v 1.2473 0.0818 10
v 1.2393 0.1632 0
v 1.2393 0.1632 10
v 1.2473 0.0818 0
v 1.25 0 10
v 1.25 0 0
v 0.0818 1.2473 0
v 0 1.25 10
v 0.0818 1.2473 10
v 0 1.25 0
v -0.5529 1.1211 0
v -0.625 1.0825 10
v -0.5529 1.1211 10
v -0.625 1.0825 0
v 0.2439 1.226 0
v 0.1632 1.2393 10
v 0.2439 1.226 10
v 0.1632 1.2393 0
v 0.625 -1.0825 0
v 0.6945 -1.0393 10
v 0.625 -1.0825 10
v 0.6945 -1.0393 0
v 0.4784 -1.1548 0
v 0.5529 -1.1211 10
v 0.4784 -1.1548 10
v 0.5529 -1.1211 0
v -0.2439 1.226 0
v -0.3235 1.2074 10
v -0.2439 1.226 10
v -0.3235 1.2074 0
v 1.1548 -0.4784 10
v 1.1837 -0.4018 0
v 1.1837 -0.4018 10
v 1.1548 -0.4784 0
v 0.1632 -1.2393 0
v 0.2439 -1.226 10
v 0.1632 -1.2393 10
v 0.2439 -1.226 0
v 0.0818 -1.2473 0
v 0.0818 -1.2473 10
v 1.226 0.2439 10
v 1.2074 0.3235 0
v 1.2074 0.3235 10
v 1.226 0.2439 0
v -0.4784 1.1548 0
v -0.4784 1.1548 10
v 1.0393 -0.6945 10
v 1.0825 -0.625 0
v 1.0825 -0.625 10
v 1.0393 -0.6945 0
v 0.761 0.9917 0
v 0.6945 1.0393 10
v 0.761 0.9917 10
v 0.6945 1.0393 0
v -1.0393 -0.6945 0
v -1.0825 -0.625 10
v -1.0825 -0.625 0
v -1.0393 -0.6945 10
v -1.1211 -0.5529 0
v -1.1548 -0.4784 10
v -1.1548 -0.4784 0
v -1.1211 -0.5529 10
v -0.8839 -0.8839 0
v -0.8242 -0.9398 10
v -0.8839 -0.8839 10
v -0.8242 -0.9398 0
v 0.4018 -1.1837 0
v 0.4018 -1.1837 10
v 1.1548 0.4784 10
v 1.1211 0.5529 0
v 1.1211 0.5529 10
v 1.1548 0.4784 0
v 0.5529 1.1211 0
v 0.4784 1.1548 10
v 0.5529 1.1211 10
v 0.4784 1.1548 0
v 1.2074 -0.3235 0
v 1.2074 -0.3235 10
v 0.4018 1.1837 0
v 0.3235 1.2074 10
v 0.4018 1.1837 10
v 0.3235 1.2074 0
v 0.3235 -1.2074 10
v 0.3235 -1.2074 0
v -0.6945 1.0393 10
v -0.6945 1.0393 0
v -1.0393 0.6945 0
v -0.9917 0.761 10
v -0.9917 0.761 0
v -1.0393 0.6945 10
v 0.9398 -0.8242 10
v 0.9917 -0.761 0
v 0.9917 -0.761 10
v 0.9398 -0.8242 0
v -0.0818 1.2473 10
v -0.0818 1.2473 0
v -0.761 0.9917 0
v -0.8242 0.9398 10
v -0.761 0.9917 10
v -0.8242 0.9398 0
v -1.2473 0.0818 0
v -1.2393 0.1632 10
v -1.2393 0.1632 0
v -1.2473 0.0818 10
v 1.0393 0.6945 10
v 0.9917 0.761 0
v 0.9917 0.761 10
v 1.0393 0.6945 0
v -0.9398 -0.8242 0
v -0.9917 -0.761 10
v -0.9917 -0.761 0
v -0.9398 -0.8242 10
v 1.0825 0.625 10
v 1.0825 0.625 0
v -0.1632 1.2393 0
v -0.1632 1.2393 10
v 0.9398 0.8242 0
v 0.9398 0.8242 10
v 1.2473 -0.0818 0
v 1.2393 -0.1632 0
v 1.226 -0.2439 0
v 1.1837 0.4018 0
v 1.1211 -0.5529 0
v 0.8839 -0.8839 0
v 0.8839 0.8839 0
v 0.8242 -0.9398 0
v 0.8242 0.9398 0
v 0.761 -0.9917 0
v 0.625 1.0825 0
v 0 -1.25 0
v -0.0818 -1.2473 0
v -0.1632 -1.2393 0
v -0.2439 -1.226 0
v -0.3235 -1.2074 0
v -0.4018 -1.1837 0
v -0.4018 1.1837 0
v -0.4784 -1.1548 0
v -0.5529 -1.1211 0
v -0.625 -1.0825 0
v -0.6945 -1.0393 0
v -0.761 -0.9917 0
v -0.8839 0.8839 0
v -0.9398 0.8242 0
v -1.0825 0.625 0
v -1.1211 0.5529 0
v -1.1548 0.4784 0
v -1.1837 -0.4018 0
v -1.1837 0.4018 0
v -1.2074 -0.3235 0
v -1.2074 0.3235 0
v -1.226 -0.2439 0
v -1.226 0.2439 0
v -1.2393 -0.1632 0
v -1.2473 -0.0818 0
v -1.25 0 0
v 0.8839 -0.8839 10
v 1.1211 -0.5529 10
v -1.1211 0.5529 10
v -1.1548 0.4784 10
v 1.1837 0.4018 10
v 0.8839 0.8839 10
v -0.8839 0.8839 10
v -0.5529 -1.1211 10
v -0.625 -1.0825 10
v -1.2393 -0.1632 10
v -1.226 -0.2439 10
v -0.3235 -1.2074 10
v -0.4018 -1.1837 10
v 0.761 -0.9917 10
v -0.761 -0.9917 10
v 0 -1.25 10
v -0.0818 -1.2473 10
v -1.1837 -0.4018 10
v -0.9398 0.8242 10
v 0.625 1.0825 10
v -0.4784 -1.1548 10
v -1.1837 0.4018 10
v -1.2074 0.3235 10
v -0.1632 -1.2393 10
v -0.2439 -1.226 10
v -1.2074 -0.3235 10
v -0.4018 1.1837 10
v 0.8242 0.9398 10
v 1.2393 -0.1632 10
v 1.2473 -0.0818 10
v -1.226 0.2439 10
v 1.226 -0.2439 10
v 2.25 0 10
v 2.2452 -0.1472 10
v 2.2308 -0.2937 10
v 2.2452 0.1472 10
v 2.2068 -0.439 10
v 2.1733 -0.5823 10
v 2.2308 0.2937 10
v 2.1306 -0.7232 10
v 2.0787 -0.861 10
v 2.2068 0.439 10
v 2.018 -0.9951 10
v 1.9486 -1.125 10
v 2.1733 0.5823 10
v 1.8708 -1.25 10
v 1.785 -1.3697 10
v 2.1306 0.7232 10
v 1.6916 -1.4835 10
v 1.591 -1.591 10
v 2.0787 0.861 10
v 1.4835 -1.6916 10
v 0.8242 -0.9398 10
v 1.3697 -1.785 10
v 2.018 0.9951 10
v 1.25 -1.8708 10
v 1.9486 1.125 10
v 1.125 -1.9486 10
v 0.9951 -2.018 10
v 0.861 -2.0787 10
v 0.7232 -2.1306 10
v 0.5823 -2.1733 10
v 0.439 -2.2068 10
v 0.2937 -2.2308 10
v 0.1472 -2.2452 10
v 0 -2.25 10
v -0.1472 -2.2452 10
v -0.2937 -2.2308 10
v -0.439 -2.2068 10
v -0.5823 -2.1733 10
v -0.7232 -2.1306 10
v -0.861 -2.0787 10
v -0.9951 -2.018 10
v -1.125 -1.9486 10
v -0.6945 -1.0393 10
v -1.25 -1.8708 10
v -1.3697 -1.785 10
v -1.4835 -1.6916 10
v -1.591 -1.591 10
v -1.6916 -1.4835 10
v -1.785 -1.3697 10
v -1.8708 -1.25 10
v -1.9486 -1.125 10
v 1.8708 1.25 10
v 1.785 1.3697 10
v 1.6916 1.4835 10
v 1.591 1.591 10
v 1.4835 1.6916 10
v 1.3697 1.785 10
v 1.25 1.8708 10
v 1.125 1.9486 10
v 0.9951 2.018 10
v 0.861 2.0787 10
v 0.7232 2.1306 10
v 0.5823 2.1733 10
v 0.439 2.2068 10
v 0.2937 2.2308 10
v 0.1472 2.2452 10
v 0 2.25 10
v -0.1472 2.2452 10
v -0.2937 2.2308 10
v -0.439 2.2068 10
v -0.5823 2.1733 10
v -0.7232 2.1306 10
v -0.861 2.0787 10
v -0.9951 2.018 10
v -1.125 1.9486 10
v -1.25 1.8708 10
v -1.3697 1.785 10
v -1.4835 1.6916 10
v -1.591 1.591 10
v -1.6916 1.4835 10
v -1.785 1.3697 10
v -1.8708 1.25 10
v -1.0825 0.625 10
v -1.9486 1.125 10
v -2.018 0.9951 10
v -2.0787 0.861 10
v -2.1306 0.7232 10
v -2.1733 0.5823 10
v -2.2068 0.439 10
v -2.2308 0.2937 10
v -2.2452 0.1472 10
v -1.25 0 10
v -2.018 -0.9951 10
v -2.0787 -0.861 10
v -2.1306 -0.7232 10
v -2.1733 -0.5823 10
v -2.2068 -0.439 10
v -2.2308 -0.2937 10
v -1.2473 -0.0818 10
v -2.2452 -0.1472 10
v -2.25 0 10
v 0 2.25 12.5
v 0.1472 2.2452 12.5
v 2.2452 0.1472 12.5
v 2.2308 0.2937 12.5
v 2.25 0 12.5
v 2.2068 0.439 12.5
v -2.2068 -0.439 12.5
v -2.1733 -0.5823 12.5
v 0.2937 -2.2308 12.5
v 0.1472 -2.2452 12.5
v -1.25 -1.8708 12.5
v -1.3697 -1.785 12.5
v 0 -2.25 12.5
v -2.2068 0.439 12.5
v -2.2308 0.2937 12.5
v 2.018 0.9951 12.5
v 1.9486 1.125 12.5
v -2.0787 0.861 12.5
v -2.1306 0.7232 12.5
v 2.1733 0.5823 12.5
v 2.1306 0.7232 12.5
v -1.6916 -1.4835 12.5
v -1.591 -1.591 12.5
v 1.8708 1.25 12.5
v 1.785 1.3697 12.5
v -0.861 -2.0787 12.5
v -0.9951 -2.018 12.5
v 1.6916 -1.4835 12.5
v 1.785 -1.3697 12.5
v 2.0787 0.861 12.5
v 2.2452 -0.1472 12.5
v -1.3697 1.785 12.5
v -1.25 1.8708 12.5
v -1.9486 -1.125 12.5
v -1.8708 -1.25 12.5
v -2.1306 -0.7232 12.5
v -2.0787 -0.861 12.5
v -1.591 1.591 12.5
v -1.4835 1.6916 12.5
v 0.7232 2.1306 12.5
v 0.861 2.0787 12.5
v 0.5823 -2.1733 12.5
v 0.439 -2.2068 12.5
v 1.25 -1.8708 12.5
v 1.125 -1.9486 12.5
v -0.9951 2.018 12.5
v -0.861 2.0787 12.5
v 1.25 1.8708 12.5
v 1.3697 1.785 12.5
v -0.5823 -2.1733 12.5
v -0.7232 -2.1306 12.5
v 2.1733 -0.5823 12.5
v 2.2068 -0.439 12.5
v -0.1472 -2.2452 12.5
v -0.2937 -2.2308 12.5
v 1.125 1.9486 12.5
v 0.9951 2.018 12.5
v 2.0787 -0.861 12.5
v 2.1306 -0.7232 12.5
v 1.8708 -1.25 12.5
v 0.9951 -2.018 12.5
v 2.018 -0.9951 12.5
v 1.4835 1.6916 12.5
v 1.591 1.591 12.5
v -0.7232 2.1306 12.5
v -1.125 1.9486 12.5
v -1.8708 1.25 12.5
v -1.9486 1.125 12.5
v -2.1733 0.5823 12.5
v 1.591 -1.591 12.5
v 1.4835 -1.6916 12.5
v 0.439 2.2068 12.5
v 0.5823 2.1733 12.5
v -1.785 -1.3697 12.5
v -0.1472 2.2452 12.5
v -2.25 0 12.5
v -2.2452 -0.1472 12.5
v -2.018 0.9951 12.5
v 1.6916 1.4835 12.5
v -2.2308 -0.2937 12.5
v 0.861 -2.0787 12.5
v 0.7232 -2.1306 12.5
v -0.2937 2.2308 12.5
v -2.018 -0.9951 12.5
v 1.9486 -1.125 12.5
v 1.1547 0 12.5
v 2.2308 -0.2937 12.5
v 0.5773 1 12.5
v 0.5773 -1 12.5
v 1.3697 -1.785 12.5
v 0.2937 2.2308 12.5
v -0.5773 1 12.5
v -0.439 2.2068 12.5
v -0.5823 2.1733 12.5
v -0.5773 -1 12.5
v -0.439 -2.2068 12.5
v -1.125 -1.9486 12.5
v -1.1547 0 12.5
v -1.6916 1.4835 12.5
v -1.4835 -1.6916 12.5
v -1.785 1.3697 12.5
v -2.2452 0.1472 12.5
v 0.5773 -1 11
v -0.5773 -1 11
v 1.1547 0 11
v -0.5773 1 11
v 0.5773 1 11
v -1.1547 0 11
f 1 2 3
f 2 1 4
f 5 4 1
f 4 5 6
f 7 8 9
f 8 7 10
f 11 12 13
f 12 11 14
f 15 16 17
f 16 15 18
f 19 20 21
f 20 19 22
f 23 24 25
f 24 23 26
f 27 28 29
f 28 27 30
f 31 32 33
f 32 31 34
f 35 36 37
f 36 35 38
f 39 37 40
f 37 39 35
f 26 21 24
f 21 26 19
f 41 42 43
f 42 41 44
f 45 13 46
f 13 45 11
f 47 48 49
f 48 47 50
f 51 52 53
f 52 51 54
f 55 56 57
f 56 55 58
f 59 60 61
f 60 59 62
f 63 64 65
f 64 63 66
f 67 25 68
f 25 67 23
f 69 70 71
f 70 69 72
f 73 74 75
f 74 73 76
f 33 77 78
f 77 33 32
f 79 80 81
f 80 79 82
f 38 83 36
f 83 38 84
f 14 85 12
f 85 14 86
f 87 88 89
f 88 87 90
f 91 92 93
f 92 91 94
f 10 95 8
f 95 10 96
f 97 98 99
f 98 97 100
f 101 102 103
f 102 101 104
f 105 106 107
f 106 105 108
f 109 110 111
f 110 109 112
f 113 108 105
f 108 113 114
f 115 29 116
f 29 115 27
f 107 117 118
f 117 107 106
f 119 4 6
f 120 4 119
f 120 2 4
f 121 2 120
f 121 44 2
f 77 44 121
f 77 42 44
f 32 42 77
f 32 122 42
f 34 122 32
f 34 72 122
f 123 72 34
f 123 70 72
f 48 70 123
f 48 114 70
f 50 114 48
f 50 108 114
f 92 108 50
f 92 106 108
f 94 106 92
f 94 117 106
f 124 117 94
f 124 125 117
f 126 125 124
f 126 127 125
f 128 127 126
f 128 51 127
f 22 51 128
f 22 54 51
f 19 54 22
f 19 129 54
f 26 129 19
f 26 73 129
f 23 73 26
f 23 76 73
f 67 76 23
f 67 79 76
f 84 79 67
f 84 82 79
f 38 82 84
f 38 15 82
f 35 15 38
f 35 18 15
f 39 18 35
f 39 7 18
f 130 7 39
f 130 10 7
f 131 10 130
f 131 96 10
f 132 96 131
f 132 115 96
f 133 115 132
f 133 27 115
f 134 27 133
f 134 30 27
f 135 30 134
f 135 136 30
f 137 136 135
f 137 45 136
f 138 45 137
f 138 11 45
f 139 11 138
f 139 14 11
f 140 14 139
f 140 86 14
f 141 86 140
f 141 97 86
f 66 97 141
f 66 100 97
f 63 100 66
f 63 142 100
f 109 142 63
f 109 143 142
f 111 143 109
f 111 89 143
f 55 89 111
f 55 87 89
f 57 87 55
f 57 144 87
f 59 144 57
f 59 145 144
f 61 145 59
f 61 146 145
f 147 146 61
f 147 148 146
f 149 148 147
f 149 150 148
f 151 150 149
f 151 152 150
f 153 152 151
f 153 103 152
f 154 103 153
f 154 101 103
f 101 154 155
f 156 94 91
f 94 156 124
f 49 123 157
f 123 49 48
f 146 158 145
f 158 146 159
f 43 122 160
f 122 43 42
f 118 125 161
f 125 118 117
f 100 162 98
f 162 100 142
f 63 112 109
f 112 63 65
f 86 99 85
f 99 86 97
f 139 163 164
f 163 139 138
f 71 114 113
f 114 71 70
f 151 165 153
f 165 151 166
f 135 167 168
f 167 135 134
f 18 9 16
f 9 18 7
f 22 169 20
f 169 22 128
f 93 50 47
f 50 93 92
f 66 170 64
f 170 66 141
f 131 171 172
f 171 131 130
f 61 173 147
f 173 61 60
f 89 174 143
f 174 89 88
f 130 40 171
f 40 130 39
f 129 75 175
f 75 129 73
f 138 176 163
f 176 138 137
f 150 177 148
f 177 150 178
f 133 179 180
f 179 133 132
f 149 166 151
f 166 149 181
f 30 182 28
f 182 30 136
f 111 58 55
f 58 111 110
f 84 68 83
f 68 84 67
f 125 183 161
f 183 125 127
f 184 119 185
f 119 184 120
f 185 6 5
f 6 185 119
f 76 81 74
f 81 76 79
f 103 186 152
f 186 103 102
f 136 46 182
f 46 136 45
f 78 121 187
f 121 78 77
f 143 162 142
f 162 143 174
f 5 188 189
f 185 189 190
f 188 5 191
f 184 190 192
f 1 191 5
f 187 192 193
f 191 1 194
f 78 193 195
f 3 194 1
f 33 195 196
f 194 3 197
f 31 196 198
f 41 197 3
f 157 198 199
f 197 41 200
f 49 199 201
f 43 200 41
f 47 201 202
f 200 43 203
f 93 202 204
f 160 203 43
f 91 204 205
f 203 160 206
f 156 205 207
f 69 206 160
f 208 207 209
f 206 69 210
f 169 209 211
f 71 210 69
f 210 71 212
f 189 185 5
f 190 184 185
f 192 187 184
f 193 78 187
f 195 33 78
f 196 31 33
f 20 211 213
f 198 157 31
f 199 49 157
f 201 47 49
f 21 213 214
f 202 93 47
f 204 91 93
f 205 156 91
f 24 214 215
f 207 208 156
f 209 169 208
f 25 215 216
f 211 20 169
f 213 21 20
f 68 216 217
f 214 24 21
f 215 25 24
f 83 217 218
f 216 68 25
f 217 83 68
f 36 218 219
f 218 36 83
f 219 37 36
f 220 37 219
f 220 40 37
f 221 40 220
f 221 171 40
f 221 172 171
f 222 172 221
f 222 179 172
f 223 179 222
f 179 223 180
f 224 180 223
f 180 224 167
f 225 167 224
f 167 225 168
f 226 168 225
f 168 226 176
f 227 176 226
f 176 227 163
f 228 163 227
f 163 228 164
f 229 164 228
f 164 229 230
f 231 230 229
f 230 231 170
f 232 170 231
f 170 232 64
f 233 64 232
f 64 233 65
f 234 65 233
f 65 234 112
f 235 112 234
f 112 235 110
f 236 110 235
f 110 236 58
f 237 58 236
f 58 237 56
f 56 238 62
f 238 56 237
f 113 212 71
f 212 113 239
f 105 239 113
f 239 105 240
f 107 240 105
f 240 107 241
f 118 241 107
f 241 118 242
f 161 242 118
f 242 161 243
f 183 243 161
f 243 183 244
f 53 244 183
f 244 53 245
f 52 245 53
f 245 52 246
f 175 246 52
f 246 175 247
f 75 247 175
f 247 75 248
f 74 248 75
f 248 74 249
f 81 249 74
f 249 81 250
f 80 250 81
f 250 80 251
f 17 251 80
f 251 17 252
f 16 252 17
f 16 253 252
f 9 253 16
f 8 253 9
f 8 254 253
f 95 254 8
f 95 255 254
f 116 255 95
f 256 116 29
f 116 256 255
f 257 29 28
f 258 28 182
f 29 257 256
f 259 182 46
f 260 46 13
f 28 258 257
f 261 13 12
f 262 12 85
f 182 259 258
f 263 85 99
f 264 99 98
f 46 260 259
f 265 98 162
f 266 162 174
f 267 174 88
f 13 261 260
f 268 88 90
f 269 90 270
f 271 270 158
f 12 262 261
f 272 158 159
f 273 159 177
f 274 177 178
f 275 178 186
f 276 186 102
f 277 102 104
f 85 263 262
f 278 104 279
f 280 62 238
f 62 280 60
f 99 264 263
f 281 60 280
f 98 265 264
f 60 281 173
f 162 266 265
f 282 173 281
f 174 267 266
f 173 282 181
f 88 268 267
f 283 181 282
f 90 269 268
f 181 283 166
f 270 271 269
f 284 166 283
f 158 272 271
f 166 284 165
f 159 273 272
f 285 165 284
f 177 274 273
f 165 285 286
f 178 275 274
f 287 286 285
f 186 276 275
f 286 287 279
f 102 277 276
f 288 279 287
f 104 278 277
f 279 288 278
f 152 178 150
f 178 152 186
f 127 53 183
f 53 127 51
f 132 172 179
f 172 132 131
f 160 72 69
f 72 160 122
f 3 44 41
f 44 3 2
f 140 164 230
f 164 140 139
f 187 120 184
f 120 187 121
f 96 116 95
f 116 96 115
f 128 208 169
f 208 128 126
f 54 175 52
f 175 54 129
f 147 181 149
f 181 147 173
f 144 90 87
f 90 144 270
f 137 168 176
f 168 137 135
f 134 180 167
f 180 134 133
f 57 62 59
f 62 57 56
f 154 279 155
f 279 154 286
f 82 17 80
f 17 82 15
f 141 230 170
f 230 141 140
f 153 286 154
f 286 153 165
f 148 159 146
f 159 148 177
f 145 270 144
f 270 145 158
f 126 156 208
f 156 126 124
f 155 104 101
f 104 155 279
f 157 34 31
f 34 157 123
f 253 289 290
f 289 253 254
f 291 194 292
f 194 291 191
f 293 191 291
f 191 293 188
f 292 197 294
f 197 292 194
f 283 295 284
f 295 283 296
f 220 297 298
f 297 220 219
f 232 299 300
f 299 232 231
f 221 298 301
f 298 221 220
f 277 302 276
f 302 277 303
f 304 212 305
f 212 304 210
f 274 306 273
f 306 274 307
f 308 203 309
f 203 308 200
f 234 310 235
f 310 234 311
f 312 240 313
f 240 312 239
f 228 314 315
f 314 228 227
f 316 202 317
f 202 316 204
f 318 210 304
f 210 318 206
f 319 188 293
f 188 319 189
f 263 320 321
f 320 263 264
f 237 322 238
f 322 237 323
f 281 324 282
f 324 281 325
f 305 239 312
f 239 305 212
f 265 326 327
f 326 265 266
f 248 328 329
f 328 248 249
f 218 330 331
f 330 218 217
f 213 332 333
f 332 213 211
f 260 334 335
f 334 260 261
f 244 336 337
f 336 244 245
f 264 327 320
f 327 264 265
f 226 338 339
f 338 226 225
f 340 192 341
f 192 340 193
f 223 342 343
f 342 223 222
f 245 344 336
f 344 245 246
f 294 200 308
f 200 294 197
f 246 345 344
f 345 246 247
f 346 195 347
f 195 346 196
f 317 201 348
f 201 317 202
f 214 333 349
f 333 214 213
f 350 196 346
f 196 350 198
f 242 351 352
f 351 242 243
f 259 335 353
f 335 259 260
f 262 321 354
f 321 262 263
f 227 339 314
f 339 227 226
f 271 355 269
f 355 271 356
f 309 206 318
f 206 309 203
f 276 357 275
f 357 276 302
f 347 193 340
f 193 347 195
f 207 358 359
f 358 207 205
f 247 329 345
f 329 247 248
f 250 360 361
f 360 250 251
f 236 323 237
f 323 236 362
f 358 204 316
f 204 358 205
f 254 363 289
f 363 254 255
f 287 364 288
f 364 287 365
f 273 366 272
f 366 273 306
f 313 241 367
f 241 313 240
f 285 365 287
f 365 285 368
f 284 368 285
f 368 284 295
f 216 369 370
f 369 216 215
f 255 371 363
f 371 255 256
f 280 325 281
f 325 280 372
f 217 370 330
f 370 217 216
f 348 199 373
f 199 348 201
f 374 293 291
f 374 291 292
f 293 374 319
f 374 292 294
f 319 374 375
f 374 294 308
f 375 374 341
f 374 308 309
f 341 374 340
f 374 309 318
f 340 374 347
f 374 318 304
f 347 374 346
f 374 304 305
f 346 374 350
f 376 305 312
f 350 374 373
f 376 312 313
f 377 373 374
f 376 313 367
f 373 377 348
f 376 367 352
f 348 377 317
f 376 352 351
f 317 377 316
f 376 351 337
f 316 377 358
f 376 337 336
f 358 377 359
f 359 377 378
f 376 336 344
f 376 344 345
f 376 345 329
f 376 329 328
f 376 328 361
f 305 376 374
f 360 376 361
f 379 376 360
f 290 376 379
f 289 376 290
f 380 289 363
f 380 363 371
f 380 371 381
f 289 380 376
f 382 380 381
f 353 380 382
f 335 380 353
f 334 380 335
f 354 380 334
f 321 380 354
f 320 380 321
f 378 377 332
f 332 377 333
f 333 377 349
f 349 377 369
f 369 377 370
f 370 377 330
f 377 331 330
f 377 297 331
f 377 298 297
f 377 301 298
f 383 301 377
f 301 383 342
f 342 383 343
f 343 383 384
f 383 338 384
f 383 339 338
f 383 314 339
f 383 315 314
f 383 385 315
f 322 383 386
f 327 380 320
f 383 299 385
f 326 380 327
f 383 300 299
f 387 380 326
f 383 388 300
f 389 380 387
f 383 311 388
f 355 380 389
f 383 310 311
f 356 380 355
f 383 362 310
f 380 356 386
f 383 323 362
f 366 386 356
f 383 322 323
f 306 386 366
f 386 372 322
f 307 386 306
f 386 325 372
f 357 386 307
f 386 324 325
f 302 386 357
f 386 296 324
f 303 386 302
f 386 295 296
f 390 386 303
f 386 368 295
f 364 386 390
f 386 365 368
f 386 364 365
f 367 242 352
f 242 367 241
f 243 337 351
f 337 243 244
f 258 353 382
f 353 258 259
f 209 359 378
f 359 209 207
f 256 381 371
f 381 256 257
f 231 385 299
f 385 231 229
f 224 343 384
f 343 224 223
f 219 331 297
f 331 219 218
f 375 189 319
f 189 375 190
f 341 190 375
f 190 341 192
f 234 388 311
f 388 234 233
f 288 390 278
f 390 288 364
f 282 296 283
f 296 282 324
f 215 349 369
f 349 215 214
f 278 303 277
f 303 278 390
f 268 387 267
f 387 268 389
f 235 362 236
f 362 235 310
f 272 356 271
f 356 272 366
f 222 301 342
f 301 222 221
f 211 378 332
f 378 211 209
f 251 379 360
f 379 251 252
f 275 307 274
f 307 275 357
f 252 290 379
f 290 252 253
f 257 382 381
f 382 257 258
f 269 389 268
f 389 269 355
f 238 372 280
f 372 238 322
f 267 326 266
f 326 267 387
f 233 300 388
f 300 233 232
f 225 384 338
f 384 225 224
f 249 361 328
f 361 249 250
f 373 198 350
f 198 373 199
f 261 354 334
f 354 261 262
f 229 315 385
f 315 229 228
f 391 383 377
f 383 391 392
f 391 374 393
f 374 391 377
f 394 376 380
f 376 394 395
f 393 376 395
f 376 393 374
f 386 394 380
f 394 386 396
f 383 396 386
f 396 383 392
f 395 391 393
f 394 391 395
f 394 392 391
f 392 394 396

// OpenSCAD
$fn = 96;

shaft_d = 2.5;
length = 10;

head_d = 4.5;
head_h = 2.5;

// Approximate hex socket for M2.5: 2.0mm across flats, depth ~1.5mm
socket_af = 2.0;
socket_depth = 1.5;

module hex_prism(af, h) {
    // Regular hex with across-flats = af => circumradius = af / sqrt(3)
    r = af / sqrt(3);
    cylinder(h = h, r = r, $fn = 6);
}

difference() {
    union() {
        // Shaft
        cylinder(h = length, d = shaft_d);

        // Head
        translate([0,0,length])
            cylinder(h = head_h, d = head_d);
    }

    // Hex socket cut
    translate([0,0,length + head_h - socket_depth])
        hex_prism(socket_af, socket_depth + 0.01);
}
